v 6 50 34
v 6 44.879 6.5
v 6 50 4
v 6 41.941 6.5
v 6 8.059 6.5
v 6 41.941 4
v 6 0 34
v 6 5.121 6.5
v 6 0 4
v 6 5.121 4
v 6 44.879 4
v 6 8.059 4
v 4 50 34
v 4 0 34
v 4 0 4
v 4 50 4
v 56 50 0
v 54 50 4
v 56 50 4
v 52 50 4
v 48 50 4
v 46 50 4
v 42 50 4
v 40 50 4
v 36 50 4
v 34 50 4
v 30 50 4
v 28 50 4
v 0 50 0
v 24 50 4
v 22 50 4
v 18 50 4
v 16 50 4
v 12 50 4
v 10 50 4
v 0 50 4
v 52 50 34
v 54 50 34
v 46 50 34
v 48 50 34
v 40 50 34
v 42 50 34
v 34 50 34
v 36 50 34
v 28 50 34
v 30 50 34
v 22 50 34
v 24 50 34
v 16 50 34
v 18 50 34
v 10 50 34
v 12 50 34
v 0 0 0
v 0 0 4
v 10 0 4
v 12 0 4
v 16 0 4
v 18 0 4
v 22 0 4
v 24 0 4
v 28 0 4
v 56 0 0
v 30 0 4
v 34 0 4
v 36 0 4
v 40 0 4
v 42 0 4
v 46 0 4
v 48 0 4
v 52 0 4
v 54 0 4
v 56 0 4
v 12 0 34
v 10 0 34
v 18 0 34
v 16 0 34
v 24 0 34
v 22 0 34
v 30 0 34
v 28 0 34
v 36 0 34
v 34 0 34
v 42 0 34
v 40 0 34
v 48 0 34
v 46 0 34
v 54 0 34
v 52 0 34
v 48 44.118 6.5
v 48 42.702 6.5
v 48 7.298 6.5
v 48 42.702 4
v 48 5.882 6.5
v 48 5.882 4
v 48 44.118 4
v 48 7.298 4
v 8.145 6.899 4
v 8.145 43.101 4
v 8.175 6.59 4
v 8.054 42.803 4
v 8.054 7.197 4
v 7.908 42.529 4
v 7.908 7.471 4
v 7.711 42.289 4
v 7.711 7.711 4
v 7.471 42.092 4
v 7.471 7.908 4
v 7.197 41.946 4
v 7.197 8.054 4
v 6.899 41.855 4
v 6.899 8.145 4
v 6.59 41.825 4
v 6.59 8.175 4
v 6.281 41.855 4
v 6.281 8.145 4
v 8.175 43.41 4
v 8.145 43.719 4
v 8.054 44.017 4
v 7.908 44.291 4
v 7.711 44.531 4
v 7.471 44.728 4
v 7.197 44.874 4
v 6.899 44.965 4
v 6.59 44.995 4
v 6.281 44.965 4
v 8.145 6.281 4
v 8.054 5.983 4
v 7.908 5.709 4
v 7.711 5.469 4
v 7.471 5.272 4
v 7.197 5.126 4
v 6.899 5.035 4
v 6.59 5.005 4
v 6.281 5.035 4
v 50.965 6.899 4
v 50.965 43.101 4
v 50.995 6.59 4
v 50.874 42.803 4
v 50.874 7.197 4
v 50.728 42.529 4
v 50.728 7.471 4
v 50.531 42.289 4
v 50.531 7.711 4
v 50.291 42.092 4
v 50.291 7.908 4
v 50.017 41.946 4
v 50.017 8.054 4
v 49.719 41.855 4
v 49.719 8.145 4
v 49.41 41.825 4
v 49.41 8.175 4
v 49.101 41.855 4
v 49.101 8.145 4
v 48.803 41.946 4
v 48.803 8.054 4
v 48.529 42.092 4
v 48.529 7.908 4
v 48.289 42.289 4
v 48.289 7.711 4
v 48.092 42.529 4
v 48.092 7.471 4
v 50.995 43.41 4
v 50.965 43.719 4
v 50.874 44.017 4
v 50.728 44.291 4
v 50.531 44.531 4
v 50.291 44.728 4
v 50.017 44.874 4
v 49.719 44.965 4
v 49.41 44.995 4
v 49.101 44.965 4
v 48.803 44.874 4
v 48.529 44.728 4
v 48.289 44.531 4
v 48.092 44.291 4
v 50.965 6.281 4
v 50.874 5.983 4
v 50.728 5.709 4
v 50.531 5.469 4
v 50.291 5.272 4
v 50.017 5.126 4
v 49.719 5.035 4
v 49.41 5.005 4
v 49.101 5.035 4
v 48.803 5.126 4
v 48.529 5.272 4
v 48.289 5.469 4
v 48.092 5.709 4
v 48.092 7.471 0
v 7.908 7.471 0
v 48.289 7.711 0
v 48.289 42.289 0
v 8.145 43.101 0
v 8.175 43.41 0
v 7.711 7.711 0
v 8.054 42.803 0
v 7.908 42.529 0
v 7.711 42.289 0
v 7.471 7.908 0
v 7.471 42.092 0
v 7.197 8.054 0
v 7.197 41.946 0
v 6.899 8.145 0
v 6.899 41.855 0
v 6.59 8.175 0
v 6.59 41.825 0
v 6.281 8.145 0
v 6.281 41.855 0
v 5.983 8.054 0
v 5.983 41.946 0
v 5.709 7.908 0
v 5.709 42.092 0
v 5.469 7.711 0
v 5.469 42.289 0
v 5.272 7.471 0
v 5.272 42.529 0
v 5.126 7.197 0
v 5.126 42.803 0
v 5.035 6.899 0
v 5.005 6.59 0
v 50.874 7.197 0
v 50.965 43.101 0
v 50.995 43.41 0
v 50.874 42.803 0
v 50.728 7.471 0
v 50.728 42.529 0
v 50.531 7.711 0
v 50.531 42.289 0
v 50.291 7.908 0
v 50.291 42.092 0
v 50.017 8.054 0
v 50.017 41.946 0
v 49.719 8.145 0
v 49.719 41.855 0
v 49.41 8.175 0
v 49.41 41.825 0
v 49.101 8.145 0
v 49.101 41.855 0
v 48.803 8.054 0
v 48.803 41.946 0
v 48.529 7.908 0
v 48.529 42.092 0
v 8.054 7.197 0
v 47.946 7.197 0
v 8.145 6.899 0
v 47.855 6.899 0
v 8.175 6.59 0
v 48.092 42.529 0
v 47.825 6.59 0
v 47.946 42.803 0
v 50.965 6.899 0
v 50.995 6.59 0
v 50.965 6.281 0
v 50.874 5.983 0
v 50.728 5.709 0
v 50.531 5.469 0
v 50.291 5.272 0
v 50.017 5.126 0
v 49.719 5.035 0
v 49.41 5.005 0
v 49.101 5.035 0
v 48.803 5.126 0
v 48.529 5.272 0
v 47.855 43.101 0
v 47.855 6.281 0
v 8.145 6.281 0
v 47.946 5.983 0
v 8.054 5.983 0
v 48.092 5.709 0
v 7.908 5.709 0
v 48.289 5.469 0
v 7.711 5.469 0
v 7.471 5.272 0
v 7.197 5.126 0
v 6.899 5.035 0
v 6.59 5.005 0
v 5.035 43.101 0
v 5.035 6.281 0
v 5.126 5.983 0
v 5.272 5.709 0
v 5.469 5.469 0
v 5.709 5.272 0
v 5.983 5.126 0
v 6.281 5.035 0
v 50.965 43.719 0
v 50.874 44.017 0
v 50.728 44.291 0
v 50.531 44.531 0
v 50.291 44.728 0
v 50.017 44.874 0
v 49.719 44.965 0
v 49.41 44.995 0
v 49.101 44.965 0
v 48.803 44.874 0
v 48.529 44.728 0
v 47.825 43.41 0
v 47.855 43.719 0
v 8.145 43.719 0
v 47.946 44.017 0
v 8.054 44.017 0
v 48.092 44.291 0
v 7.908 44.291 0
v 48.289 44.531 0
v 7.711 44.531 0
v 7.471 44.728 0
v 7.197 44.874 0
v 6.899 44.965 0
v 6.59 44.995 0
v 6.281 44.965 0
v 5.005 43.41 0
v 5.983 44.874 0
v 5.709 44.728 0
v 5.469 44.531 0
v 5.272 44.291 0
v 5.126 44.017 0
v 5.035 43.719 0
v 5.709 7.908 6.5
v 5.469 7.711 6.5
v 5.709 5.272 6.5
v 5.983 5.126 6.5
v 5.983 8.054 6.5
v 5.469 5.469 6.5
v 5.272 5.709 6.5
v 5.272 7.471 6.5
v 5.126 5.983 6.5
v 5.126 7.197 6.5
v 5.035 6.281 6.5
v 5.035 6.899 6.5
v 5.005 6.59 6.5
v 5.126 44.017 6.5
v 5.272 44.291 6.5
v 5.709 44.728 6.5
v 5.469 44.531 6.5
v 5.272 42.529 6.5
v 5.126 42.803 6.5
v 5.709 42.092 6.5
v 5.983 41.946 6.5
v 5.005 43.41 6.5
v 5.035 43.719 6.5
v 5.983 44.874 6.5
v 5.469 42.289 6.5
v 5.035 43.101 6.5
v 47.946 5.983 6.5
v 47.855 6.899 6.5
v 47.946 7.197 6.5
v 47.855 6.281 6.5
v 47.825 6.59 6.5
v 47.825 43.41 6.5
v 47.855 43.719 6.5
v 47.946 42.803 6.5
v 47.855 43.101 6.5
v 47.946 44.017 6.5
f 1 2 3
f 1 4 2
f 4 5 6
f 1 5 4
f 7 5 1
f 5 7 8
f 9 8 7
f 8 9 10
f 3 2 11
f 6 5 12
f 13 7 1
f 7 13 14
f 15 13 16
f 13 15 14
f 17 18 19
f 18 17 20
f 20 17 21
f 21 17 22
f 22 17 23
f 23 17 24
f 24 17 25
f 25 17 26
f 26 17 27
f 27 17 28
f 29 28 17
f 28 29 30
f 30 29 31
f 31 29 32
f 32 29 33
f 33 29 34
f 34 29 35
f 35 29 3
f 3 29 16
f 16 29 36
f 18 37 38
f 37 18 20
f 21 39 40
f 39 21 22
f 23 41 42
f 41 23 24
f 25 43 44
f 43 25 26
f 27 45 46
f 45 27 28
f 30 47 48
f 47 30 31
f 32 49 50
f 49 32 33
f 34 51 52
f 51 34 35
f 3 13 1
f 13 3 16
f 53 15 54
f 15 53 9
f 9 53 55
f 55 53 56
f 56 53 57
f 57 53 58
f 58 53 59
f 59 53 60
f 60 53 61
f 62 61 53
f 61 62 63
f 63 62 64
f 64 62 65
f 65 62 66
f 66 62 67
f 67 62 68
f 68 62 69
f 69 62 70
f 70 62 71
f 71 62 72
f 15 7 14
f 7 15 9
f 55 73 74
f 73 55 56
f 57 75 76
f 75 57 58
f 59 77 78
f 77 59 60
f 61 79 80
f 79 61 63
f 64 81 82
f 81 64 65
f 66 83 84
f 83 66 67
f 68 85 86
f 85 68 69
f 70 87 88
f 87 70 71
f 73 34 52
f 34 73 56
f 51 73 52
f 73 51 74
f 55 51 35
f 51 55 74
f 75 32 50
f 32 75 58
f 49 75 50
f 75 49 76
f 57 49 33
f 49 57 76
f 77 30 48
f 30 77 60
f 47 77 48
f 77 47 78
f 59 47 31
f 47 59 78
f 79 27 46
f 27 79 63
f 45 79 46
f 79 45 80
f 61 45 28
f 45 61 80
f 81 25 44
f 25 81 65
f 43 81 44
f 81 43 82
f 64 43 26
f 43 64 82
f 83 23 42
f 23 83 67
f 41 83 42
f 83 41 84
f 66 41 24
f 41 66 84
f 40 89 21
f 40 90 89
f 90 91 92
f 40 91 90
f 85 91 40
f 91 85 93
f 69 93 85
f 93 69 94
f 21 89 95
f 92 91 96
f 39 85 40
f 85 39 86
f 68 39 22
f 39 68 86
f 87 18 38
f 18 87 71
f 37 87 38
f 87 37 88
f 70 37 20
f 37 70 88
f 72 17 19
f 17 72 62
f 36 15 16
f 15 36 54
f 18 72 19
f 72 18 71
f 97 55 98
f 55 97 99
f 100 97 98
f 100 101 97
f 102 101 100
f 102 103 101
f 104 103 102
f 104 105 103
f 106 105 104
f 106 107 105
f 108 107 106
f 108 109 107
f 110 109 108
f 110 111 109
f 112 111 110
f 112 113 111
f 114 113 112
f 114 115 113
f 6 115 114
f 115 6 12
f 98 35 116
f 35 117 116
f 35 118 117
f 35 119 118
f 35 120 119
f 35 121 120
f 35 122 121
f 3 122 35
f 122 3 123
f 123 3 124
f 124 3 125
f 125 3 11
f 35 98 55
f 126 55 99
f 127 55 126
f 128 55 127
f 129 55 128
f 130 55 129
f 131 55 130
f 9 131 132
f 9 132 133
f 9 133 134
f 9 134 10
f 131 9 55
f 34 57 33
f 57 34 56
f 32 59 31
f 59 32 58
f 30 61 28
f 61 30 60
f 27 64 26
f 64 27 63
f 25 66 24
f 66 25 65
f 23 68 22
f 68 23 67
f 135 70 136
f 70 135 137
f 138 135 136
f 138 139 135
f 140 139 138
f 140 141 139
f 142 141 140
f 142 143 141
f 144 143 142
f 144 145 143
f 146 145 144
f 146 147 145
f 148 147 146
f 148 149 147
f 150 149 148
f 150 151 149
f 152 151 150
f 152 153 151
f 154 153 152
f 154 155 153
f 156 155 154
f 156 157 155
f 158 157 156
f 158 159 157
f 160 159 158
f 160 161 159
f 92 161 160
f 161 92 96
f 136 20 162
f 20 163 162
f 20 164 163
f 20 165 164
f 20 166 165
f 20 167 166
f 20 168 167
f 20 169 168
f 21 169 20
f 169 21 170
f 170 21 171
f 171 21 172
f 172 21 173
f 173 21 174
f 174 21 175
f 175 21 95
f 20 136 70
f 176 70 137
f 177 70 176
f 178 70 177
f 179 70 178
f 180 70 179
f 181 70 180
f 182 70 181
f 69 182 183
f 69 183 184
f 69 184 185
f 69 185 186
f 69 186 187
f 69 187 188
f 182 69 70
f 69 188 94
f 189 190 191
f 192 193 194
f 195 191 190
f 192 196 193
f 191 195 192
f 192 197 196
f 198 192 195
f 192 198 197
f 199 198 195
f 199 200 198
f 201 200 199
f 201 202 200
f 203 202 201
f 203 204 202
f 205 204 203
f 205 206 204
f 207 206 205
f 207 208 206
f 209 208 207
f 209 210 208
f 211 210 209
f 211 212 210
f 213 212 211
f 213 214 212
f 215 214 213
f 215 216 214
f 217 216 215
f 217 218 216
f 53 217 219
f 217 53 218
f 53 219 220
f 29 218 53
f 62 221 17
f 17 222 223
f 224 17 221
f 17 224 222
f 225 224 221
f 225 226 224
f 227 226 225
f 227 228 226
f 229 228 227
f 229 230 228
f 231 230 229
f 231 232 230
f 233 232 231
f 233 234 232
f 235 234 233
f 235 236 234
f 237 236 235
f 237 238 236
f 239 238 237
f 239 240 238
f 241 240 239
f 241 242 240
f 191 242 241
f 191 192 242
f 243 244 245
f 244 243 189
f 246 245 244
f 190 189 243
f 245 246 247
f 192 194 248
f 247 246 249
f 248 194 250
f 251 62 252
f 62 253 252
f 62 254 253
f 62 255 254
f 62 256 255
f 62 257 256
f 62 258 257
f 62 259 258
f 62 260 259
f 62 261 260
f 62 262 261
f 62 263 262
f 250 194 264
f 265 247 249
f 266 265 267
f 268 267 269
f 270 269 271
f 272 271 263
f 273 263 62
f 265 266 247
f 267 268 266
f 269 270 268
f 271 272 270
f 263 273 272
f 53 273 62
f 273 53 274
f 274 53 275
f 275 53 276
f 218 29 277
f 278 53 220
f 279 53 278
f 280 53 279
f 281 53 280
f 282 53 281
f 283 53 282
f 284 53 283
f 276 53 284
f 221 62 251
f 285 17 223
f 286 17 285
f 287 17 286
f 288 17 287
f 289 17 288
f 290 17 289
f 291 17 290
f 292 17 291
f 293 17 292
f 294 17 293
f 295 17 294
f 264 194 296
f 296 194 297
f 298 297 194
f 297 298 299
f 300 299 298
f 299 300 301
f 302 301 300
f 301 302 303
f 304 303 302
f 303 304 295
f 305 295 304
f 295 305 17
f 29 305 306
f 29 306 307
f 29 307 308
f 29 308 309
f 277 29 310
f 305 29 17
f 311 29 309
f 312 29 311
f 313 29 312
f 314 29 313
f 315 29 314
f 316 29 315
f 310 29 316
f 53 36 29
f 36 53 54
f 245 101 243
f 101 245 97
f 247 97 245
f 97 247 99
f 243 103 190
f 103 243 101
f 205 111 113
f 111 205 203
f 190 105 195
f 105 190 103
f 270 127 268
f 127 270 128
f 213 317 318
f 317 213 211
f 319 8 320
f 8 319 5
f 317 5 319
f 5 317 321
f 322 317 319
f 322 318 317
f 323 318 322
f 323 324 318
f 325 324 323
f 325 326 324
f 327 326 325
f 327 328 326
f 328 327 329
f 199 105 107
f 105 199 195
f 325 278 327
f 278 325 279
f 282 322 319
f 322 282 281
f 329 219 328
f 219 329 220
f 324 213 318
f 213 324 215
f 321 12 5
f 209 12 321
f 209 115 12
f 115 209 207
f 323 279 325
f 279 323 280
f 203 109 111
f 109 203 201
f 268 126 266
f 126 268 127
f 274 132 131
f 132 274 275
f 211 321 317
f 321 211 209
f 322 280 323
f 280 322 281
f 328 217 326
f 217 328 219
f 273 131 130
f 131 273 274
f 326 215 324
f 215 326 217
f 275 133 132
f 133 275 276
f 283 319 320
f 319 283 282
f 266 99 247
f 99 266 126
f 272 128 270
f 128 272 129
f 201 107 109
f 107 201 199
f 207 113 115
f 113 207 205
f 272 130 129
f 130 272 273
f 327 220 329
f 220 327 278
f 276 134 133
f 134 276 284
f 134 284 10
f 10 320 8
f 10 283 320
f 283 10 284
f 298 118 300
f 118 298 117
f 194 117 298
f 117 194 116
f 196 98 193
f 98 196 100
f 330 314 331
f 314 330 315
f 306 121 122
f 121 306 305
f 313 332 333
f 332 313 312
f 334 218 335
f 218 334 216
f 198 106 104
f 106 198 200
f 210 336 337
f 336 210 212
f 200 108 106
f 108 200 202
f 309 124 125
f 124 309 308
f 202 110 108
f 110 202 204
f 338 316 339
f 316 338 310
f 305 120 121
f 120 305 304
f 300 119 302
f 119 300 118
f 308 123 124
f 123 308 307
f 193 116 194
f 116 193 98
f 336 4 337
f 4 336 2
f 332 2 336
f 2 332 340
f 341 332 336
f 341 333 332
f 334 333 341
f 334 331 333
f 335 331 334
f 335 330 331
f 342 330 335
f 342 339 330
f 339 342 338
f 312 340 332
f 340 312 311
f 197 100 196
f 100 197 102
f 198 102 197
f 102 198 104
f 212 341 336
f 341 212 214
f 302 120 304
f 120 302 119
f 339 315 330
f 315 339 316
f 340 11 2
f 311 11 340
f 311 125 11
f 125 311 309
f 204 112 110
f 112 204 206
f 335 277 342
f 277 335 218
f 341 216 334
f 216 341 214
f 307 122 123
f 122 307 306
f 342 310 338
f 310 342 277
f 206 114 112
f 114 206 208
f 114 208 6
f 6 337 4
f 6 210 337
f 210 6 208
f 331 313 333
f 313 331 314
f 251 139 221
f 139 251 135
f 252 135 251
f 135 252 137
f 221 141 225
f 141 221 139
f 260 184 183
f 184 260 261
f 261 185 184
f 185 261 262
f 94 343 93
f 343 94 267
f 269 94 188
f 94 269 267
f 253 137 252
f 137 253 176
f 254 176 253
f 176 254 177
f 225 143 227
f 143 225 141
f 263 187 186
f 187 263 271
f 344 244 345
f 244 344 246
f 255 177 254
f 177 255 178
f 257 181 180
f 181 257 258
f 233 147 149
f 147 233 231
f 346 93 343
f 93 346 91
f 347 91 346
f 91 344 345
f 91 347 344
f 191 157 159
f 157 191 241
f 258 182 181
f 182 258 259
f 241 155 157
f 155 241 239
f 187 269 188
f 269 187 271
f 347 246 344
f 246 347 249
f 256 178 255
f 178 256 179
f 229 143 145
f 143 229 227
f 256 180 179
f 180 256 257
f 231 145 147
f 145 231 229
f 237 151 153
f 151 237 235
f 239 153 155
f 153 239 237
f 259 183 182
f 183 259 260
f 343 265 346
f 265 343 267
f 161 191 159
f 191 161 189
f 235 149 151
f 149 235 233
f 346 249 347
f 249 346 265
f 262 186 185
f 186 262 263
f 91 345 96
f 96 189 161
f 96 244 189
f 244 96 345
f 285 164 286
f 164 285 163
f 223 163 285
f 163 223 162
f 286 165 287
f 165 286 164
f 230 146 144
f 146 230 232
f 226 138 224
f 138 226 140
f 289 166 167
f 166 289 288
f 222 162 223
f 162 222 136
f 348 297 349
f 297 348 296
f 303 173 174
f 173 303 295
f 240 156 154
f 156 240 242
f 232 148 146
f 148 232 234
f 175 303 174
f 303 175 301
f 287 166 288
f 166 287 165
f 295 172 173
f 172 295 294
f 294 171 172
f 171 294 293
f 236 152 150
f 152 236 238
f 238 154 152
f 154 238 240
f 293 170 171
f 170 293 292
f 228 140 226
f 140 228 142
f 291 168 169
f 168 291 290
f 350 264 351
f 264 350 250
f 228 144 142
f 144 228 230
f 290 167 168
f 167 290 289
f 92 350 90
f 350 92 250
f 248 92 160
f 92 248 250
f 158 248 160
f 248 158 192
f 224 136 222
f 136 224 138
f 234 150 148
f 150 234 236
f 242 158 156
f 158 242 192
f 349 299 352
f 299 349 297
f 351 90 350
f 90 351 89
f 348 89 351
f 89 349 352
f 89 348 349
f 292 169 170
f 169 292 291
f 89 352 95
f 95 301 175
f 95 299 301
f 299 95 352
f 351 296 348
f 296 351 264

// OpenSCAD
$fn = 32;

// ----------------------------------------------------------------------
// Finned heat sink: 56 x 50 mm base, 30 mm fins
// ----------------------------------------------------------------------

// --- parameters (mm) ---
base_w = 56;              // base width
base_d = 50;              // base depth
base_t = 4;               // base thickness
fin_h = 30;               // fin height above the base
holes_d = 3.17;           // fixing holes
hole_x = 21.41;           // hole offset in x
hole_y = 18.41;           // hole offset in y
fin_t = 2;                // fin thickness
fin_pitch = 6;            // fin pitch
fin_count = 9;            // number of fins
fin_x0 = 4;               // first fin offset

difference() {
  union() {
    cube([base_w, base_d, base_t]);
    for (i = [0 : fin_count - 1]) {
      translate([fin_x0 + i * fin_pitch, 0, base_t - 0.5]) cube([fin_t, base_d, fin_h + 0.5]);
    }
  }
  /* fixing holes through the base, 2.5 mm clear on both sides */
  for (hx = [-21.41, 21.41]) {
    for (hy = [-18.41, 18.41]) {
      translate([base_w / 2 + hx, base_d / 2 + hy, -2.5]) cylinder(h = base_t + 5, d = holes_d);
    }
  }
}
